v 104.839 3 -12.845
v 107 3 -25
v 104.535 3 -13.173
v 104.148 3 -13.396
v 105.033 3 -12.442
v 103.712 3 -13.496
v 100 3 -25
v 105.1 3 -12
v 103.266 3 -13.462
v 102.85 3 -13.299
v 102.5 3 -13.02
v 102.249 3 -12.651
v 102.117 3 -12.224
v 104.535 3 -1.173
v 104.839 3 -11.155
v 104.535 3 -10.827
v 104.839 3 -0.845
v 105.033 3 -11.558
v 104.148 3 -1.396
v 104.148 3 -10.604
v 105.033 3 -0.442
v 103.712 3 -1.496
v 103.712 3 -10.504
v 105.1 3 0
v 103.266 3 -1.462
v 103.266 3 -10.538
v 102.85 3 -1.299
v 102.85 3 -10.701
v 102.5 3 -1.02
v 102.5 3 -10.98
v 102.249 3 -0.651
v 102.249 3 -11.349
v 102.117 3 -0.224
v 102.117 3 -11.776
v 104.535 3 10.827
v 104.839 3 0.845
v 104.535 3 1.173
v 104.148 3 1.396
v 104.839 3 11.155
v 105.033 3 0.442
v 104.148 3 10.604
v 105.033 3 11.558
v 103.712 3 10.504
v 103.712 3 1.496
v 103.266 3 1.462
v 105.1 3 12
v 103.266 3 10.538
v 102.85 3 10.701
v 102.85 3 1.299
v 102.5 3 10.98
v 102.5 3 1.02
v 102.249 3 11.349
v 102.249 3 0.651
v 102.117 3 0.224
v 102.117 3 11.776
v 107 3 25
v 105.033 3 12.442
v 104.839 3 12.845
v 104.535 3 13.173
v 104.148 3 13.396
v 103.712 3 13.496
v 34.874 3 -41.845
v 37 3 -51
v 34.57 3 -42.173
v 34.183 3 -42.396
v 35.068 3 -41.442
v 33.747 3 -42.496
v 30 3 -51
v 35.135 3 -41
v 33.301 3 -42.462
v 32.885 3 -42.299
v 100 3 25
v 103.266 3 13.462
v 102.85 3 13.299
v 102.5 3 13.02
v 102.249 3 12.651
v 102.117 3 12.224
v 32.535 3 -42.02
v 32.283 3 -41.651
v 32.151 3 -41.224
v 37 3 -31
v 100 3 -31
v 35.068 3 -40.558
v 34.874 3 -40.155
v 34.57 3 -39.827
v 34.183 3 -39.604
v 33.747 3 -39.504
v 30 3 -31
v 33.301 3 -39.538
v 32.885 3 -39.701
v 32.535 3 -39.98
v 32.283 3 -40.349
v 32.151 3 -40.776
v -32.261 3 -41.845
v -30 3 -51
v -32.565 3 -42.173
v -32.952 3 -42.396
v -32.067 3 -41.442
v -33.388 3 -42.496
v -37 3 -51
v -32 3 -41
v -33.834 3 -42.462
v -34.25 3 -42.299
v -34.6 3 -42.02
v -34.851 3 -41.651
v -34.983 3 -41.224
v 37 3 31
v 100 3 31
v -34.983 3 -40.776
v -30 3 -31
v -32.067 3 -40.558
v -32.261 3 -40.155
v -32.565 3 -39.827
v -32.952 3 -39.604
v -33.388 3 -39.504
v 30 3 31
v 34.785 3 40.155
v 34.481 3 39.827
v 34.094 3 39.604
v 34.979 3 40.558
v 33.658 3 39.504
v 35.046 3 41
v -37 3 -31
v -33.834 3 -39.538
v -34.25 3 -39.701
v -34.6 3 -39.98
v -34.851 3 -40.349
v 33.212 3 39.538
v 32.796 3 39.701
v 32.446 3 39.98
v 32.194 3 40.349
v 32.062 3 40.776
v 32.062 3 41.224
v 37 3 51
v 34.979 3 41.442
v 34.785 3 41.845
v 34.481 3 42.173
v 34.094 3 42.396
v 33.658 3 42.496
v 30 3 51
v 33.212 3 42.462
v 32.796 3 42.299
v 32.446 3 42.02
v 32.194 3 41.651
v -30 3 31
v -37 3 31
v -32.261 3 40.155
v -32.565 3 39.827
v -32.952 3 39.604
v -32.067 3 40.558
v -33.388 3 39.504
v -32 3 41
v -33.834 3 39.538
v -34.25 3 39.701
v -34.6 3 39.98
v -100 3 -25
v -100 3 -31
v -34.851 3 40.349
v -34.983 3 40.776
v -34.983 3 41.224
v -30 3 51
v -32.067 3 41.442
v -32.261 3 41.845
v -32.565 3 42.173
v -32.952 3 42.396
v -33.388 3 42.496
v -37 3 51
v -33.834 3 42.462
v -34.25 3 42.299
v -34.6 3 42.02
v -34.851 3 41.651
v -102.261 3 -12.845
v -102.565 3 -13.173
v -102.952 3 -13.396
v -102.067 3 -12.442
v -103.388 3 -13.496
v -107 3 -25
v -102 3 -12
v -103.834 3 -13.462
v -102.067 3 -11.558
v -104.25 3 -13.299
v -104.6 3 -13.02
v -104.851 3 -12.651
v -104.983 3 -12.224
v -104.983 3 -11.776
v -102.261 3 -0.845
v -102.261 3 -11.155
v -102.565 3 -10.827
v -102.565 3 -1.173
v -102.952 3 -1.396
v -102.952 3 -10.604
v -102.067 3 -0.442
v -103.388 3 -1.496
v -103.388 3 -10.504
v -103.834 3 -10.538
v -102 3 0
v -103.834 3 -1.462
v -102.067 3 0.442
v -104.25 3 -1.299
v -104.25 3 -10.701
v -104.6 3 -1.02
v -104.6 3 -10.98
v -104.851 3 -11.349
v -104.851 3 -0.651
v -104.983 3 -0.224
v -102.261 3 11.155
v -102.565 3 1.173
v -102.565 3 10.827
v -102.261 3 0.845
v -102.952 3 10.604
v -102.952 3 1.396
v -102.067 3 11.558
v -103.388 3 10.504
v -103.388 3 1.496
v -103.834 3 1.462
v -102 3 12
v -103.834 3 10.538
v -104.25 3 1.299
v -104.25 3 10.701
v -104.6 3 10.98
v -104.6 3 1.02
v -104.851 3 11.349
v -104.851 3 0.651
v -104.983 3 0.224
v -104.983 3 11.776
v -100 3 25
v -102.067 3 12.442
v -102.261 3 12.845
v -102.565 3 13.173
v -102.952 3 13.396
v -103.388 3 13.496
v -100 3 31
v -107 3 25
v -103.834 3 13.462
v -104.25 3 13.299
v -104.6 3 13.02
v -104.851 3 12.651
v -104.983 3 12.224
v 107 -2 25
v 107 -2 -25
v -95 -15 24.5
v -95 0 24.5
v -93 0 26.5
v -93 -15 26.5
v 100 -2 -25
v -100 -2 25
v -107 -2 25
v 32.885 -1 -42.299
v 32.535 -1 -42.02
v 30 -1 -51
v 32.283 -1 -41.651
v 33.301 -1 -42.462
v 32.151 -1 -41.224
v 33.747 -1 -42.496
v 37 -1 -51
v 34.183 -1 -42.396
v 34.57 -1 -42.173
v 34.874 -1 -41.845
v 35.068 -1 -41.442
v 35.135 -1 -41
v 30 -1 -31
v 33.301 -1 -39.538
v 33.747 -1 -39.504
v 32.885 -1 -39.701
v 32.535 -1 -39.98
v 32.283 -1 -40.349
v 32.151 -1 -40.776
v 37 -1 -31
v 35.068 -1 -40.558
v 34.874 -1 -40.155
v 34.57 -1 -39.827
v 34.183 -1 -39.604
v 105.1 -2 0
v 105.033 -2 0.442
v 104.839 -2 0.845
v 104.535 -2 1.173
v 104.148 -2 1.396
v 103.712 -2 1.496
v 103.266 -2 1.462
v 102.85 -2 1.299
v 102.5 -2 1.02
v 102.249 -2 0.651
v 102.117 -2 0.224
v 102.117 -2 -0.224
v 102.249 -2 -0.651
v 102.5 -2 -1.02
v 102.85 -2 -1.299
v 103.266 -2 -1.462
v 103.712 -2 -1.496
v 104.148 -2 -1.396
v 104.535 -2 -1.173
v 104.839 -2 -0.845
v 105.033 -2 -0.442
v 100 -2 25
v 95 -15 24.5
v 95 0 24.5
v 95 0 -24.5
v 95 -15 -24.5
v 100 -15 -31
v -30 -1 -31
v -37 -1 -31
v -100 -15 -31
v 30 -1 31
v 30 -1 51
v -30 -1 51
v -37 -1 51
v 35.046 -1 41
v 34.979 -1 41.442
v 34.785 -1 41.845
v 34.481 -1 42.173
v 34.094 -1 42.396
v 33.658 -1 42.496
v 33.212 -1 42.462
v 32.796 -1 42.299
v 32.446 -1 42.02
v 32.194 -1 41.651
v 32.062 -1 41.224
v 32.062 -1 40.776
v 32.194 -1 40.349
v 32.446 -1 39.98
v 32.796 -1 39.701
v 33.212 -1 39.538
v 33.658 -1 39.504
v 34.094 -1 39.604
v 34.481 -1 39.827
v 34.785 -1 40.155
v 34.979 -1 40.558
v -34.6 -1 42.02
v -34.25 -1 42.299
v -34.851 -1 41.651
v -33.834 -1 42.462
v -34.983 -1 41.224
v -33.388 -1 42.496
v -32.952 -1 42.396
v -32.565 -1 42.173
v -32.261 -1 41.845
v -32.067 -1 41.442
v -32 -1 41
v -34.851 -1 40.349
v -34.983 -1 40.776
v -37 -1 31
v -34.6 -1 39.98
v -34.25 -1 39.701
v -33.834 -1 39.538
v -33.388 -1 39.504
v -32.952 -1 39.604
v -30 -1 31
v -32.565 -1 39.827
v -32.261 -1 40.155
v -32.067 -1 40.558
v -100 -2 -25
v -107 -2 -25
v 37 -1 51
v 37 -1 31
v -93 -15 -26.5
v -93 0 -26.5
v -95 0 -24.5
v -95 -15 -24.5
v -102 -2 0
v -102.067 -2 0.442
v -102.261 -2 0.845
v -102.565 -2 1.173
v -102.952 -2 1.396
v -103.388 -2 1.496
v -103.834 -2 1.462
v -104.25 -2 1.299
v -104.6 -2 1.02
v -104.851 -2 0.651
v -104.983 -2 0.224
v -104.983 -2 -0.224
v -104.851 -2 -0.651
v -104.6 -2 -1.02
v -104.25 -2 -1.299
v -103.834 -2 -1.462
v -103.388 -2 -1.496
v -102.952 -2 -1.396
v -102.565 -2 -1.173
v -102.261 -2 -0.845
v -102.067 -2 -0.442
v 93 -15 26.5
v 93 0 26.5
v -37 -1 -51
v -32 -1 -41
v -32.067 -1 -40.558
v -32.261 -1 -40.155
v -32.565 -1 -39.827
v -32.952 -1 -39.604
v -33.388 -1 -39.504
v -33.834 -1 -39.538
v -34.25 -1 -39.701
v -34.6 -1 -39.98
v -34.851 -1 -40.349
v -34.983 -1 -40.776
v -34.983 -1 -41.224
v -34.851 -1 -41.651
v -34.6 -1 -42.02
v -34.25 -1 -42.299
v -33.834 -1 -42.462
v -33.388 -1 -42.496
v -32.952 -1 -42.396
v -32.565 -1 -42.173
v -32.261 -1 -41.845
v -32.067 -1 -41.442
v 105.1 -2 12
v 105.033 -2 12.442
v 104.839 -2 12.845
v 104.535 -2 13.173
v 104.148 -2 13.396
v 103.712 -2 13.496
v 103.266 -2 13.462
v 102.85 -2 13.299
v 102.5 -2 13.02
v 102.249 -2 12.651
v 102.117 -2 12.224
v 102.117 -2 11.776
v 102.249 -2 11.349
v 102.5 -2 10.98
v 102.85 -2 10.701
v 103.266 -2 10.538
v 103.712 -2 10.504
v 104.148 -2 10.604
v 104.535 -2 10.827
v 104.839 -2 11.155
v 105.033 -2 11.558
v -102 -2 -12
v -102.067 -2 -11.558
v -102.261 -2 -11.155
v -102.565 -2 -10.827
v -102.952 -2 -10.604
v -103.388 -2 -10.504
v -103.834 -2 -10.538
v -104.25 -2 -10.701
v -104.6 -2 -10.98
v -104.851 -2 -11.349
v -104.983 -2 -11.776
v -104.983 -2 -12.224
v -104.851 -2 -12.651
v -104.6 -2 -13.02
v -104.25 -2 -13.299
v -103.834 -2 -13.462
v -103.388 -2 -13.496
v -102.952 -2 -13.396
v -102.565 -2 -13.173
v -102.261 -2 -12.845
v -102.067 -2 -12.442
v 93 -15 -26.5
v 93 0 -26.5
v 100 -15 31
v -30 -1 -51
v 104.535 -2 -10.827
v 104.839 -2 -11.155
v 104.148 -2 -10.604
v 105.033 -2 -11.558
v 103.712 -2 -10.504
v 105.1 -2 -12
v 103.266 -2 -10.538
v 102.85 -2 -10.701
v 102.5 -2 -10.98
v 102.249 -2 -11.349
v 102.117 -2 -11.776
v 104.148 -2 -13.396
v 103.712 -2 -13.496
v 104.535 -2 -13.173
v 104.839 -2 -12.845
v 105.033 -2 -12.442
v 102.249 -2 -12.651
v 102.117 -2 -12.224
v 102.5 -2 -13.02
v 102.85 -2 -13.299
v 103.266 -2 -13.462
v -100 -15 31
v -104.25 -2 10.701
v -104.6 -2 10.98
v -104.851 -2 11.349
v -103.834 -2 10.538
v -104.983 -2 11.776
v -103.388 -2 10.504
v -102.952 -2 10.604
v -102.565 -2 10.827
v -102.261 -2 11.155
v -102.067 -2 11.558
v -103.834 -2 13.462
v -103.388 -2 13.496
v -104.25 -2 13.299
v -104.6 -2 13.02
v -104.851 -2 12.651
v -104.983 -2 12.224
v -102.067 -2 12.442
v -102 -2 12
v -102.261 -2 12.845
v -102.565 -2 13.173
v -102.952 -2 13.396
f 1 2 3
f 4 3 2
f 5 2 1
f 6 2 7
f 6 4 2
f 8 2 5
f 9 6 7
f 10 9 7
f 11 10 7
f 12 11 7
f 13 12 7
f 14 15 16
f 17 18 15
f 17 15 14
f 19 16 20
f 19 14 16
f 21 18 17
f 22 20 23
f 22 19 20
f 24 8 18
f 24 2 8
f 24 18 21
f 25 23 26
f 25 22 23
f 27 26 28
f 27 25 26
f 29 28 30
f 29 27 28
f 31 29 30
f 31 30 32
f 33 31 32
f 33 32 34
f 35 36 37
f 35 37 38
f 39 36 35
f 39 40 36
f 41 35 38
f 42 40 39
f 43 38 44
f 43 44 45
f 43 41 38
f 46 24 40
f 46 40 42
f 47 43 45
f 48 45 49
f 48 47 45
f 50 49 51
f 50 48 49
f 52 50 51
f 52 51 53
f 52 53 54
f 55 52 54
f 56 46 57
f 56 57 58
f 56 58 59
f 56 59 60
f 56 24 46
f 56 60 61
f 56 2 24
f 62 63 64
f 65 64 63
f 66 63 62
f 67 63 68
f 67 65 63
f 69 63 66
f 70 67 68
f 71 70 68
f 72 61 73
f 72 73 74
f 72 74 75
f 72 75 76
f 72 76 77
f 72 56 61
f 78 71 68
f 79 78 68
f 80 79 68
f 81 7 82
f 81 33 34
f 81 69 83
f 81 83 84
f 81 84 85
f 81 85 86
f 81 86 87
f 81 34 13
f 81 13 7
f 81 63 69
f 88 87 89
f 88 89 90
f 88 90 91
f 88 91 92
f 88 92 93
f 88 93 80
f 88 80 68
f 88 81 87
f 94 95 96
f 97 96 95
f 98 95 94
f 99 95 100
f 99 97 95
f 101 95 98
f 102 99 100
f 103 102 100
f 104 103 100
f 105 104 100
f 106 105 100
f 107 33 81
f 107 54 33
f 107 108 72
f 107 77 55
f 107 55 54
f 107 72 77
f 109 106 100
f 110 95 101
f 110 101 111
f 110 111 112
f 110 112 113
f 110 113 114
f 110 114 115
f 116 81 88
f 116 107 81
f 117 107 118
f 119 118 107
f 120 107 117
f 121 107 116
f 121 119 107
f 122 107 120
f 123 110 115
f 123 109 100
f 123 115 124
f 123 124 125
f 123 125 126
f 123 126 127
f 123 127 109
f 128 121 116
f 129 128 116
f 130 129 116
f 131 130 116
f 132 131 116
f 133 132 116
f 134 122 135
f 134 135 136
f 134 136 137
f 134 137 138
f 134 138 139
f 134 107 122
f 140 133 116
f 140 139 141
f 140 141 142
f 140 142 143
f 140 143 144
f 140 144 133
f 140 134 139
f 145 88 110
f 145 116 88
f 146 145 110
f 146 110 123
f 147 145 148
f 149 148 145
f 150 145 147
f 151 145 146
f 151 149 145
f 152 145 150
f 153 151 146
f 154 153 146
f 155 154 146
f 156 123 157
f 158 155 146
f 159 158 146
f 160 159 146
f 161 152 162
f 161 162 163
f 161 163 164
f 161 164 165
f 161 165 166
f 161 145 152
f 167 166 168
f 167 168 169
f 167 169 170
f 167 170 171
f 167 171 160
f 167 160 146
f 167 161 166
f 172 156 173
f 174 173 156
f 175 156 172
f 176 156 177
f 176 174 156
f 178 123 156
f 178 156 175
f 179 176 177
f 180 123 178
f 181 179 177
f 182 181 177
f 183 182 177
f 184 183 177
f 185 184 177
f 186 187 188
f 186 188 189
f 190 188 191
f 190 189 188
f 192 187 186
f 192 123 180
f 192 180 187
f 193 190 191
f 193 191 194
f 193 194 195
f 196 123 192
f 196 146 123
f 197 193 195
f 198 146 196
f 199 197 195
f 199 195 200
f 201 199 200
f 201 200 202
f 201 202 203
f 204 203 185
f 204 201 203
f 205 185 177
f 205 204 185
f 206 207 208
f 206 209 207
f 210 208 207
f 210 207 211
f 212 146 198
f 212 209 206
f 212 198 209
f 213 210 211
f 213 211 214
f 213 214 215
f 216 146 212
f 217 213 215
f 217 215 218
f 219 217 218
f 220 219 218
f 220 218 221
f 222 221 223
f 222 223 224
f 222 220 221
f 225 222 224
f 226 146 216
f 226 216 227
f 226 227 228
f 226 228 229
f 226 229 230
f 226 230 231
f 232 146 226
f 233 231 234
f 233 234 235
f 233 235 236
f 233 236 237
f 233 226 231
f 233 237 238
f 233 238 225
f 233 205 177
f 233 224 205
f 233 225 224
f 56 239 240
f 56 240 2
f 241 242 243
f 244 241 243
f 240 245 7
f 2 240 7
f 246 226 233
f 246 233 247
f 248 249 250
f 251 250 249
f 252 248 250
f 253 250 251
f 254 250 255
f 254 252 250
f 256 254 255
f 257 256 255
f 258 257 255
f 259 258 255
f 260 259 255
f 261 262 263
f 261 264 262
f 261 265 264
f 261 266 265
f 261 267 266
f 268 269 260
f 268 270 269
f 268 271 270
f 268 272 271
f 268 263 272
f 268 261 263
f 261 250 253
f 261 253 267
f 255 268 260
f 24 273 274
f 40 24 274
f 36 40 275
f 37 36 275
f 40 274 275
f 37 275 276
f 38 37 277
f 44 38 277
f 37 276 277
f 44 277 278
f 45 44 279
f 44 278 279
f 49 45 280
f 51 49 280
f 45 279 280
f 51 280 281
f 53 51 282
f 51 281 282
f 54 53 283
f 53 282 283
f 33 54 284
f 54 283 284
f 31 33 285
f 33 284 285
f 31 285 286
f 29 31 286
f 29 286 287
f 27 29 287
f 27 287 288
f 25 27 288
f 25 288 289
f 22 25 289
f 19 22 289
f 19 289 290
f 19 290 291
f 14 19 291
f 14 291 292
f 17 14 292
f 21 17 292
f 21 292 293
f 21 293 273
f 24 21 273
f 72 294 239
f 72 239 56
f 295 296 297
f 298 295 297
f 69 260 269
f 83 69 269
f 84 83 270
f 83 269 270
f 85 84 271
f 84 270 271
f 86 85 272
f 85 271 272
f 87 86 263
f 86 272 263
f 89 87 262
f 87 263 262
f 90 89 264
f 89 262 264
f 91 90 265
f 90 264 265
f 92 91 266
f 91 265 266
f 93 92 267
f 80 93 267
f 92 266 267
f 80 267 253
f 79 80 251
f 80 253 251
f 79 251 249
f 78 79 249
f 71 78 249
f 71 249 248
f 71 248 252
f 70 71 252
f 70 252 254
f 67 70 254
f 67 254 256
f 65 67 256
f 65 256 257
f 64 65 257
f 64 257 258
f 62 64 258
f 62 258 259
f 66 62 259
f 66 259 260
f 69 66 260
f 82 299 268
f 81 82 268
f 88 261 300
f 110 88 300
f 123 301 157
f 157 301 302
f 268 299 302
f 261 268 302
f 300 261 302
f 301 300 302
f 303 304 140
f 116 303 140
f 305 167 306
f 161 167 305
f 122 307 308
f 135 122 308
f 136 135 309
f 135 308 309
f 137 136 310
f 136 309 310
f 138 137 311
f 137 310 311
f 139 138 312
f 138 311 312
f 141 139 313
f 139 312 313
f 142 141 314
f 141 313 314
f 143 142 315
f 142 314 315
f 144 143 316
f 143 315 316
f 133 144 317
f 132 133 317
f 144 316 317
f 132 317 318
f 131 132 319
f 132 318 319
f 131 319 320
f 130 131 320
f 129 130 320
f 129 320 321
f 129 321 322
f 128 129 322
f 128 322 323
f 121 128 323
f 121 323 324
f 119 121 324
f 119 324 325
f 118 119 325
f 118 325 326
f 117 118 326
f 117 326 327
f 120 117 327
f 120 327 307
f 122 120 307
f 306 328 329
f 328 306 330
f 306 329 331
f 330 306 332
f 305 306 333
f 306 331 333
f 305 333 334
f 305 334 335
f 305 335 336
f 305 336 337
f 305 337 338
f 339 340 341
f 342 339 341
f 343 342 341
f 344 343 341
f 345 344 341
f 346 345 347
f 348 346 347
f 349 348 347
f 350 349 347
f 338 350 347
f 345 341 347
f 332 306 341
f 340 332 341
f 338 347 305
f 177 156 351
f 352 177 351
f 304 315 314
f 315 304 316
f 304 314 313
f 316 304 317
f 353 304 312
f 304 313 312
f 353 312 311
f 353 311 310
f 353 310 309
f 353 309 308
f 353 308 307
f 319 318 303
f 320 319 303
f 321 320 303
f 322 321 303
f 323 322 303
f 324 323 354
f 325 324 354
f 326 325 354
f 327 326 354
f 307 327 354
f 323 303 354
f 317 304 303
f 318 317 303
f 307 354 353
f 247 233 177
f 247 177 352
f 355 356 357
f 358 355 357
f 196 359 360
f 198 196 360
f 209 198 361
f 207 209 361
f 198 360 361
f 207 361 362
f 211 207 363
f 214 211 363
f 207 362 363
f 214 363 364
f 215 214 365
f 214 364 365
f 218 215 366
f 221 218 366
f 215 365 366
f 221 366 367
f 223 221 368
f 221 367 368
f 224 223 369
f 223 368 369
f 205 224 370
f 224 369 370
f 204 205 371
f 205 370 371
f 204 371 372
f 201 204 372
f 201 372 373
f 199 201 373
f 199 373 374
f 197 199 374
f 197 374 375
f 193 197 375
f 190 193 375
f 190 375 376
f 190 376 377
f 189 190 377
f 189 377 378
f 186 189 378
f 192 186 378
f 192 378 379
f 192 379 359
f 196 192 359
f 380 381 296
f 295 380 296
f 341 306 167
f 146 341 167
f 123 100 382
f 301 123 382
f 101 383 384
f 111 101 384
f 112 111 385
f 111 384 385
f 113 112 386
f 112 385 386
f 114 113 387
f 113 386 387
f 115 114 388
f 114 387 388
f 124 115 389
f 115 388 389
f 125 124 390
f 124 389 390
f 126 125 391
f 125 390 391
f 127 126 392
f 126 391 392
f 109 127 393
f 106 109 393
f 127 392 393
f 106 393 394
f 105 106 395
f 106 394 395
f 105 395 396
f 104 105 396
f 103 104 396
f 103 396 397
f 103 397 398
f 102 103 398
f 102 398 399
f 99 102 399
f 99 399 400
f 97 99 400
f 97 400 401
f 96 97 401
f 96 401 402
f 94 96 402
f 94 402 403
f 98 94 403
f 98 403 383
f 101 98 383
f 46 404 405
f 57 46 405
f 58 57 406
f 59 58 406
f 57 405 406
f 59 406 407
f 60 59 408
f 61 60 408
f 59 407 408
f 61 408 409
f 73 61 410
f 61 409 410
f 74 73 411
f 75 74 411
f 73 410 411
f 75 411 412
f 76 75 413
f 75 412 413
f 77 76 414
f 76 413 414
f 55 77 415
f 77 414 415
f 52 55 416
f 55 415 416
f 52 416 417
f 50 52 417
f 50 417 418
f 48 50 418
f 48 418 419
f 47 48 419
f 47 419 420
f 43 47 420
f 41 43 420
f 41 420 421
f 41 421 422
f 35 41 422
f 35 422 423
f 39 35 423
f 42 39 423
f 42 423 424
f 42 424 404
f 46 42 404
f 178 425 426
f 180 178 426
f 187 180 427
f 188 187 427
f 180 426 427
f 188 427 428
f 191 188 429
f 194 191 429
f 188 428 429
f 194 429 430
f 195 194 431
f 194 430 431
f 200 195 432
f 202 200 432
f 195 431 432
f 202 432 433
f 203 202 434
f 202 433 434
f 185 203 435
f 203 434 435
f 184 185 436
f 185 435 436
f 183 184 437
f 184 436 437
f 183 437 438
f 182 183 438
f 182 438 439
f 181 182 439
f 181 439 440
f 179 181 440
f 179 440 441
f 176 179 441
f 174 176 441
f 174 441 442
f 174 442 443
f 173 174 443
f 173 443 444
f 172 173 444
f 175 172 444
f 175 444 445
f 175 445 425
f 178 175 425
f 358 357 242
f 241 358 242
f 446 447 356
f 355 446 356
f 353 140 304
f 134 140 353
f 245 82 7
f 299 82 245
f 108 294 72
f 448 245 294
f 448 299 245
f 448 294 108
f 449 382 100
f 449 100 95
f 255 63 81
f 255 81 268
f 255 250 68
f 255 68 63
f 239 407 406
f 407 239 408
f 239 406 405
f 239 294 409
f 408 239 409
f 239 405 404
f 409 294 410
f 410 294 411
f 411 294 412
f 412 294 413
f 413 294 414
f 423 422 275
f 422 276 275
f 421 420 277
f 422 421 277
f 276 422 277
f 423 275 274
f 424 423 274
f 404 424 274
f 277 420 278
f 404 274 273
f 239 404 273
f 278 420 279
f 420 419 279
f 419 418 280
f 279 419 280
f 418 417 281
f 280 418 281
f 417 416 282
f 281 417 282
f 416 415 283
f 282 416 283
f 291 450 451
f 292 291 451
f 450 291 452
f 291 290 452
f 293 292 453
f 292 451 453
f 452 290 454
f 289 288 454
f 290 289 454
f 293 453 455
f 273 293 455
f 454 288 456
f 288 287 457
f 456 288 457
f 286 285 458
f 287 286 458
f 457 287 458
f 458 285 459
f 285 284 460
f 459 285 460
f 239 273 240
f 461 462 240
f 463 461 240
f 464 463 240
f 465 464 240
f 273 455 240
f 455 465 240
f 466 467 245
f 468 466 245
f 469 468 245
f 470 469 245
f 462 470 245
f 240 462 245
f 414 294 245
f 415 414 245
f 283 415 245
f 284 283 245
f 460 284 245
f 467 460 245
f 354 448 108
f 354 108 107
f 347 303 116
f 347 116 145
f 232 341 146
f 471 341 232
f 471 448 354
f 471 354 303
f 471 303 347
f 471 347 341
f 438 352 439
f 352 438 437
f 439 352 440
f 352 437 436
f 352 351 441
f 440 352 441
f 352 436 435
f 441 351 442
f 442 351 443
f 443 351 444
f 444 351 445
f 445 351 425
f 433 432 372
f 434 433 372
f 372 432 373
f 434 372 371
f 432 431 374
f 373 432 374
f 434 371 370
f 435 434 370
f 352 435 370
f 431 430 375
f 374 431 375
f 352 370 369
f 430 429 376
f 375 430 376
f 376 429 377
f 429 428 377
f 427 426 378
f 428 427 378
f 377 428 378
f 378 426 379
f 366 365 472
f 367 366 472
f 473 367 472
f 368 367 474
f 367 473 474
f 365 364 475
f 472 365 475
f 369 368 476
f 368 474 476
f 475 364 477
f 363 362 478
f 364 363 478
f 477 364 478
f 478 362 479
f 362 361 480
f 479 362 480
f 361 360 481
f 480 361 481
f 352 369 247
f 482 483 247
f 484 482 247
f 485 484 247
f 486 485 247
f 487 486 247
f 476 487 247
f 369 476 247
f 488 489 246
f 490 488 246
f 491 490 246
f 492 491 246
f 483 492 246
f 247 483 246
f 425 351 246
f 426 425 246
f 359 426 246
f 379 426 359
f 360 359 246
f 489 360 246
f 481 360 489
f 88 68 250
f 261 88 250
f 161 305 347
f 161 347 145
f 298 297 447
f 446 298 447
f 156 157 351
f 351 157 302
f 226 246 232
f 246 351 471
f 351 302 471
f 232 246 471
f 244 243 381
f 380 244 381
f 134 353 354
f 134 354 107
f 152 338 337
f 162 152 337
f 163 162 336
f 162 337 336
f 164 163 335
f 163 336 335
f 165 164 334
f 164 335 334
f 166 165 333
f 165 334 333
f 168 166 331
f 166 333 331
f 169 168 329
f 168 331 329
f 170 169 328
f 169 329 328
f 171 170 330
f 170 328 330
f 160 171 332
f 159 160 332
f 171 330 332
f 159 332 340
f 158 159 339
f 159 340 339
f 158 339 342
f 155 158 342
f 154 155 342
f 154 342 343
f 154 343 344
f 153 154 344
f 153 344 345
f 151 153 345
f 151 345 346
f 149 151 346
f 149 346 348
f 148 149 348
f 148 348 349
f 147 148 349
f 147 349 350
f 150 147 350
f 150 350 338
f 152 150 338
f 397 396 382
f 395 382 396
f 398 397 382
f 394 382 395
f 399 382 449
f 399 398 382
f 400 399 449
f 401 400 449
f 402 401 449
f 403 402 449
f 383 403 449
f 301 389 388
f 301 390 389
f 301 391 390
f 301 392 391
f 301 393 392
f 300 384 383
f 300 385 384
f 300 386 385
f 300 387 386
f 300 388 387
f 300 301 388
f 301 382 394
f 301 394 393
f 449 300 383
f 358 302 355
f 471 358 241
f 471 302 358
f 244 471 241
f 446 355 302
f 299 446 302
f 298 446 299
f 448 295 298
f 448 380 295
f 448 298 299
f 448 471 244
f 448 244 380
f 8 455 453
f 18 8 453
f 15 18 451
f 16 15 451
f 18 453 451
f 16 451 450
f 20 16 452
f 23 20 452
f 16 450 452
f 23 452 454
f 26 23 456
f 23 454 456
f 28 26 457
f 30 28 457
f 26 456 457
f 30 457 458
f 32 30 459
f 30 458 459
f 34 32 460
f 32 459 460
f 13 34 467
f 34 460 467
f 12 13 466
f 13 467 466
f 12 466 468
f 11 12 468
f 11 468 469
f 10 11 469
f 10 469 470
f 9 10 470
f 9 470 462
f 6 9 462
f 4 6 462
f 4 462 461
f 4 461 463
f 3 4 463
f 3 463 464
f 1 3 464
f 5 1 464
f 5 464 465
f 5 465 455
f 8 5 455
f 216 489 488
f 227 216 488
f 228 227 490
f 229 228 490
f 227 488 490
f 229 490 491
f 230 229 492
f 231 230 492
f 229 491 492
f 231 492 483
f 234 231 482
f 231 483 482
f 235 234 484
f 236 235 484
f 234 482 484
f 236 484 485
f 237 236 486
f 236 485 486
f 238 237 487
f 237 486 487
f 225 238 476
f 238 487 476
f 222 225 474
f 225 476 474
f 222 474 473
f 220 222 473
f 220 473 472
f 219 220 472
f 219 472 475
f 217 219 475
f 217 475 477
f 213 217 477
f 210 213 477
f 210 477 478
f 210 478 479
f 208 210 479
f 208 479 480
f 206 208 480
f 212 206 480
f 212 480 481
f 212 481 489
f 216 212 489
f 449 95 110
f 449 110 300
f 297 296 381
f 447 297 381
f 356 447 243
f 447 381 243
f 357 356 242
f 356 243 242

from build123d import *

# Parameters (mm, degrees)
F0_W      = 200
F0_H      = 62
F1_DEPTH  = 15
F2_W      = 200
F2_H      = 62
F3_DEPTH  = 3
F4_W      = 5
F4_H      = 25
F5_DEPTH  = 7
F6_R      = 1.5
F7_DEPTH  = 12.6
F8_W      = 5
F8_H      = 25
F9_DEPTH  = 7
F10_R     = 1.5
F11_DEPTH = 25
F12_W     = 7
F12_H     = 4
F13_DEPTH = 20
F14_R     = 1.5
F15_DEPTH = 25
F16_W     = 7
F16_H     = 4
F17_DEPTH = 20
F18_R     = 1.5
F19_DEPTH = 25


with BuildPart() as f1:
    # F0 (on Front) → F1 (new body)
    with BuildSketch(Plane.XZ):
        Rectangle(F0_W, F0_H)
        Polygon((95, -24.5), (95, -26.5), (93, -26.5), (-93, -26.5), (-95, -26.5), (-95, -24.5), (-95, 24.5), (-95, 26.5), (-93, 26.5), (93, 26.5), (95, 26.5), (95, 24.5), align=None, mode=Mode.SUBTRACT)
        Polygon((-95, -26.5), (-93, -26.5), (-95, -24.5), align=None)
        Polygon((-95, 26.5), (-95, 24.5), (-93, 26.5), align=None)
        Polygon((93, -26.5), (95, -26.5), (95, -24.5), align=None)
        Polygon((93, 26.5), (95, 24.5), (95, 26.5), align=None)
    extrude(amount=F1_DEPTH)

    # F2 (on face) → F3 (join)
    with BuildSketch(Plane(origin=(0, 0, 0), x_dir=(-1, 0, 0), z_dir=(0, 1, 0))):
        Rectangle(F2_W, F2_H)
        Polygon((95, 24.5), (95, -24.5), (93, -26.5), (-93, -26.5), (-95, -24.5), (-95, 24.5), (-93, 26.5), (93, 26.5), align=None, mode=Mode.SUBTRACT)
        Polygon((93, -26.5), (95, -24.5), (95, 24.5), (93, 26.5), (-93, 26.5), (-95, 24.5), (-95, -24.5), (-93, -26.5), align=None)
    extrude(amount=F3_DEPTH)

    # F4 (on face) → F5 (join)
    with BuildSketch(Plane(origin=(-100, 0, 0), x_dir=(0, -1, 0), z_dir=(-1, 0, 0))):
        with Locations((-0.5, 12.5)):
            Rectangle(F4_W, F4_H)
        with Locations((-0.5, -12.5)):
            Rectangle(F4_W, F4_H)
    extrude(amount=F5_DEPTH)

    # F6 (on face) → F7 (cut)
    with BuildSketch(Plane.XZ.offset(2)):
        with Locations((-103.5, 12)):
            Circle(F6_R)
        with Locations((-103.5, 0)):
            Circle(F6_R)
        with Locations((-103.5, -12)):
            Circle(F6_R)
    extrude(amount=-F7_DEPTH, mode=Mode.SUBTRACT)

    # F8 (on face) → F9 (join)
    with BuildSketch(Plane.YZ.offset(100)):
        with Locations((0.5, 12.5)):
            Rectangle(F8_W, F8_H)
        with Locations((0.5, -12.5)):
            Rectangle(F8_W, F8_H)
    extrude(amount=F9_DEPTH)

    # F10 (on face) → F11 (cut)
    with BuildSketch(Plane.XZ.offset(2)):
        with Locations((103.6, 0)):
            Circle(F10_R)
        with Locations((103.6, 12)):
            Circle(F10_R)
        with Locations((103.6, -12)):
            Circle(F10_R)
    extrude(amount=-F11_DEPTH, mode=Mode.SUBTRACT)

    # F12 (on face) → F13 (join)
    with BuildSketch(Plane.XY.offset(31)):
        with Locations((-33.5, 1)):
            Rectangle(F12_W, F12_H)
        with Locations((33.5, 1)):
            Rectangle(F12_W, F12_H)
    extrude(amount=F13_DEPTH)

    # F14 (on face) → F15 (cut)
    with BuildSketch(Plane.XZ.offset(1)):
        with Locations((-33.5, 41)):
            Circle(F14_R)
        with Locations((33.5457399487, 41)):
            Circle(F14_R)
    extrude(amount=-F15_DEPTH, mode=Mode.SUBTRACT)

    # F16 (on face) → F17 (join)
    with BuildSketch(Plane(origin=(0, 0, -31), x_dir=(1, 0, 0), z_dir=(0, 0, -1))):
        with Locations((-33.5, -1)):
            Rectangle(F16_W, F16_H)
        with Locations((33.5, -1)):
            Rectangle(F16_W, F16_H)
    extrude(amount=F17_DEPTH)

    # F18 (on face) → F19 (cut)
    with BuildSketch(Plane.XZ.offset(1)):
        with Locations((-33.5, -41)):
            Circle(F18_R)
        with Locations((33.6346849799, -41)):
            Circle(F18_R)
    extrude(amount=-F19_DEPTH, mode=Mode.SUBTRACT)


solid = f1.part
